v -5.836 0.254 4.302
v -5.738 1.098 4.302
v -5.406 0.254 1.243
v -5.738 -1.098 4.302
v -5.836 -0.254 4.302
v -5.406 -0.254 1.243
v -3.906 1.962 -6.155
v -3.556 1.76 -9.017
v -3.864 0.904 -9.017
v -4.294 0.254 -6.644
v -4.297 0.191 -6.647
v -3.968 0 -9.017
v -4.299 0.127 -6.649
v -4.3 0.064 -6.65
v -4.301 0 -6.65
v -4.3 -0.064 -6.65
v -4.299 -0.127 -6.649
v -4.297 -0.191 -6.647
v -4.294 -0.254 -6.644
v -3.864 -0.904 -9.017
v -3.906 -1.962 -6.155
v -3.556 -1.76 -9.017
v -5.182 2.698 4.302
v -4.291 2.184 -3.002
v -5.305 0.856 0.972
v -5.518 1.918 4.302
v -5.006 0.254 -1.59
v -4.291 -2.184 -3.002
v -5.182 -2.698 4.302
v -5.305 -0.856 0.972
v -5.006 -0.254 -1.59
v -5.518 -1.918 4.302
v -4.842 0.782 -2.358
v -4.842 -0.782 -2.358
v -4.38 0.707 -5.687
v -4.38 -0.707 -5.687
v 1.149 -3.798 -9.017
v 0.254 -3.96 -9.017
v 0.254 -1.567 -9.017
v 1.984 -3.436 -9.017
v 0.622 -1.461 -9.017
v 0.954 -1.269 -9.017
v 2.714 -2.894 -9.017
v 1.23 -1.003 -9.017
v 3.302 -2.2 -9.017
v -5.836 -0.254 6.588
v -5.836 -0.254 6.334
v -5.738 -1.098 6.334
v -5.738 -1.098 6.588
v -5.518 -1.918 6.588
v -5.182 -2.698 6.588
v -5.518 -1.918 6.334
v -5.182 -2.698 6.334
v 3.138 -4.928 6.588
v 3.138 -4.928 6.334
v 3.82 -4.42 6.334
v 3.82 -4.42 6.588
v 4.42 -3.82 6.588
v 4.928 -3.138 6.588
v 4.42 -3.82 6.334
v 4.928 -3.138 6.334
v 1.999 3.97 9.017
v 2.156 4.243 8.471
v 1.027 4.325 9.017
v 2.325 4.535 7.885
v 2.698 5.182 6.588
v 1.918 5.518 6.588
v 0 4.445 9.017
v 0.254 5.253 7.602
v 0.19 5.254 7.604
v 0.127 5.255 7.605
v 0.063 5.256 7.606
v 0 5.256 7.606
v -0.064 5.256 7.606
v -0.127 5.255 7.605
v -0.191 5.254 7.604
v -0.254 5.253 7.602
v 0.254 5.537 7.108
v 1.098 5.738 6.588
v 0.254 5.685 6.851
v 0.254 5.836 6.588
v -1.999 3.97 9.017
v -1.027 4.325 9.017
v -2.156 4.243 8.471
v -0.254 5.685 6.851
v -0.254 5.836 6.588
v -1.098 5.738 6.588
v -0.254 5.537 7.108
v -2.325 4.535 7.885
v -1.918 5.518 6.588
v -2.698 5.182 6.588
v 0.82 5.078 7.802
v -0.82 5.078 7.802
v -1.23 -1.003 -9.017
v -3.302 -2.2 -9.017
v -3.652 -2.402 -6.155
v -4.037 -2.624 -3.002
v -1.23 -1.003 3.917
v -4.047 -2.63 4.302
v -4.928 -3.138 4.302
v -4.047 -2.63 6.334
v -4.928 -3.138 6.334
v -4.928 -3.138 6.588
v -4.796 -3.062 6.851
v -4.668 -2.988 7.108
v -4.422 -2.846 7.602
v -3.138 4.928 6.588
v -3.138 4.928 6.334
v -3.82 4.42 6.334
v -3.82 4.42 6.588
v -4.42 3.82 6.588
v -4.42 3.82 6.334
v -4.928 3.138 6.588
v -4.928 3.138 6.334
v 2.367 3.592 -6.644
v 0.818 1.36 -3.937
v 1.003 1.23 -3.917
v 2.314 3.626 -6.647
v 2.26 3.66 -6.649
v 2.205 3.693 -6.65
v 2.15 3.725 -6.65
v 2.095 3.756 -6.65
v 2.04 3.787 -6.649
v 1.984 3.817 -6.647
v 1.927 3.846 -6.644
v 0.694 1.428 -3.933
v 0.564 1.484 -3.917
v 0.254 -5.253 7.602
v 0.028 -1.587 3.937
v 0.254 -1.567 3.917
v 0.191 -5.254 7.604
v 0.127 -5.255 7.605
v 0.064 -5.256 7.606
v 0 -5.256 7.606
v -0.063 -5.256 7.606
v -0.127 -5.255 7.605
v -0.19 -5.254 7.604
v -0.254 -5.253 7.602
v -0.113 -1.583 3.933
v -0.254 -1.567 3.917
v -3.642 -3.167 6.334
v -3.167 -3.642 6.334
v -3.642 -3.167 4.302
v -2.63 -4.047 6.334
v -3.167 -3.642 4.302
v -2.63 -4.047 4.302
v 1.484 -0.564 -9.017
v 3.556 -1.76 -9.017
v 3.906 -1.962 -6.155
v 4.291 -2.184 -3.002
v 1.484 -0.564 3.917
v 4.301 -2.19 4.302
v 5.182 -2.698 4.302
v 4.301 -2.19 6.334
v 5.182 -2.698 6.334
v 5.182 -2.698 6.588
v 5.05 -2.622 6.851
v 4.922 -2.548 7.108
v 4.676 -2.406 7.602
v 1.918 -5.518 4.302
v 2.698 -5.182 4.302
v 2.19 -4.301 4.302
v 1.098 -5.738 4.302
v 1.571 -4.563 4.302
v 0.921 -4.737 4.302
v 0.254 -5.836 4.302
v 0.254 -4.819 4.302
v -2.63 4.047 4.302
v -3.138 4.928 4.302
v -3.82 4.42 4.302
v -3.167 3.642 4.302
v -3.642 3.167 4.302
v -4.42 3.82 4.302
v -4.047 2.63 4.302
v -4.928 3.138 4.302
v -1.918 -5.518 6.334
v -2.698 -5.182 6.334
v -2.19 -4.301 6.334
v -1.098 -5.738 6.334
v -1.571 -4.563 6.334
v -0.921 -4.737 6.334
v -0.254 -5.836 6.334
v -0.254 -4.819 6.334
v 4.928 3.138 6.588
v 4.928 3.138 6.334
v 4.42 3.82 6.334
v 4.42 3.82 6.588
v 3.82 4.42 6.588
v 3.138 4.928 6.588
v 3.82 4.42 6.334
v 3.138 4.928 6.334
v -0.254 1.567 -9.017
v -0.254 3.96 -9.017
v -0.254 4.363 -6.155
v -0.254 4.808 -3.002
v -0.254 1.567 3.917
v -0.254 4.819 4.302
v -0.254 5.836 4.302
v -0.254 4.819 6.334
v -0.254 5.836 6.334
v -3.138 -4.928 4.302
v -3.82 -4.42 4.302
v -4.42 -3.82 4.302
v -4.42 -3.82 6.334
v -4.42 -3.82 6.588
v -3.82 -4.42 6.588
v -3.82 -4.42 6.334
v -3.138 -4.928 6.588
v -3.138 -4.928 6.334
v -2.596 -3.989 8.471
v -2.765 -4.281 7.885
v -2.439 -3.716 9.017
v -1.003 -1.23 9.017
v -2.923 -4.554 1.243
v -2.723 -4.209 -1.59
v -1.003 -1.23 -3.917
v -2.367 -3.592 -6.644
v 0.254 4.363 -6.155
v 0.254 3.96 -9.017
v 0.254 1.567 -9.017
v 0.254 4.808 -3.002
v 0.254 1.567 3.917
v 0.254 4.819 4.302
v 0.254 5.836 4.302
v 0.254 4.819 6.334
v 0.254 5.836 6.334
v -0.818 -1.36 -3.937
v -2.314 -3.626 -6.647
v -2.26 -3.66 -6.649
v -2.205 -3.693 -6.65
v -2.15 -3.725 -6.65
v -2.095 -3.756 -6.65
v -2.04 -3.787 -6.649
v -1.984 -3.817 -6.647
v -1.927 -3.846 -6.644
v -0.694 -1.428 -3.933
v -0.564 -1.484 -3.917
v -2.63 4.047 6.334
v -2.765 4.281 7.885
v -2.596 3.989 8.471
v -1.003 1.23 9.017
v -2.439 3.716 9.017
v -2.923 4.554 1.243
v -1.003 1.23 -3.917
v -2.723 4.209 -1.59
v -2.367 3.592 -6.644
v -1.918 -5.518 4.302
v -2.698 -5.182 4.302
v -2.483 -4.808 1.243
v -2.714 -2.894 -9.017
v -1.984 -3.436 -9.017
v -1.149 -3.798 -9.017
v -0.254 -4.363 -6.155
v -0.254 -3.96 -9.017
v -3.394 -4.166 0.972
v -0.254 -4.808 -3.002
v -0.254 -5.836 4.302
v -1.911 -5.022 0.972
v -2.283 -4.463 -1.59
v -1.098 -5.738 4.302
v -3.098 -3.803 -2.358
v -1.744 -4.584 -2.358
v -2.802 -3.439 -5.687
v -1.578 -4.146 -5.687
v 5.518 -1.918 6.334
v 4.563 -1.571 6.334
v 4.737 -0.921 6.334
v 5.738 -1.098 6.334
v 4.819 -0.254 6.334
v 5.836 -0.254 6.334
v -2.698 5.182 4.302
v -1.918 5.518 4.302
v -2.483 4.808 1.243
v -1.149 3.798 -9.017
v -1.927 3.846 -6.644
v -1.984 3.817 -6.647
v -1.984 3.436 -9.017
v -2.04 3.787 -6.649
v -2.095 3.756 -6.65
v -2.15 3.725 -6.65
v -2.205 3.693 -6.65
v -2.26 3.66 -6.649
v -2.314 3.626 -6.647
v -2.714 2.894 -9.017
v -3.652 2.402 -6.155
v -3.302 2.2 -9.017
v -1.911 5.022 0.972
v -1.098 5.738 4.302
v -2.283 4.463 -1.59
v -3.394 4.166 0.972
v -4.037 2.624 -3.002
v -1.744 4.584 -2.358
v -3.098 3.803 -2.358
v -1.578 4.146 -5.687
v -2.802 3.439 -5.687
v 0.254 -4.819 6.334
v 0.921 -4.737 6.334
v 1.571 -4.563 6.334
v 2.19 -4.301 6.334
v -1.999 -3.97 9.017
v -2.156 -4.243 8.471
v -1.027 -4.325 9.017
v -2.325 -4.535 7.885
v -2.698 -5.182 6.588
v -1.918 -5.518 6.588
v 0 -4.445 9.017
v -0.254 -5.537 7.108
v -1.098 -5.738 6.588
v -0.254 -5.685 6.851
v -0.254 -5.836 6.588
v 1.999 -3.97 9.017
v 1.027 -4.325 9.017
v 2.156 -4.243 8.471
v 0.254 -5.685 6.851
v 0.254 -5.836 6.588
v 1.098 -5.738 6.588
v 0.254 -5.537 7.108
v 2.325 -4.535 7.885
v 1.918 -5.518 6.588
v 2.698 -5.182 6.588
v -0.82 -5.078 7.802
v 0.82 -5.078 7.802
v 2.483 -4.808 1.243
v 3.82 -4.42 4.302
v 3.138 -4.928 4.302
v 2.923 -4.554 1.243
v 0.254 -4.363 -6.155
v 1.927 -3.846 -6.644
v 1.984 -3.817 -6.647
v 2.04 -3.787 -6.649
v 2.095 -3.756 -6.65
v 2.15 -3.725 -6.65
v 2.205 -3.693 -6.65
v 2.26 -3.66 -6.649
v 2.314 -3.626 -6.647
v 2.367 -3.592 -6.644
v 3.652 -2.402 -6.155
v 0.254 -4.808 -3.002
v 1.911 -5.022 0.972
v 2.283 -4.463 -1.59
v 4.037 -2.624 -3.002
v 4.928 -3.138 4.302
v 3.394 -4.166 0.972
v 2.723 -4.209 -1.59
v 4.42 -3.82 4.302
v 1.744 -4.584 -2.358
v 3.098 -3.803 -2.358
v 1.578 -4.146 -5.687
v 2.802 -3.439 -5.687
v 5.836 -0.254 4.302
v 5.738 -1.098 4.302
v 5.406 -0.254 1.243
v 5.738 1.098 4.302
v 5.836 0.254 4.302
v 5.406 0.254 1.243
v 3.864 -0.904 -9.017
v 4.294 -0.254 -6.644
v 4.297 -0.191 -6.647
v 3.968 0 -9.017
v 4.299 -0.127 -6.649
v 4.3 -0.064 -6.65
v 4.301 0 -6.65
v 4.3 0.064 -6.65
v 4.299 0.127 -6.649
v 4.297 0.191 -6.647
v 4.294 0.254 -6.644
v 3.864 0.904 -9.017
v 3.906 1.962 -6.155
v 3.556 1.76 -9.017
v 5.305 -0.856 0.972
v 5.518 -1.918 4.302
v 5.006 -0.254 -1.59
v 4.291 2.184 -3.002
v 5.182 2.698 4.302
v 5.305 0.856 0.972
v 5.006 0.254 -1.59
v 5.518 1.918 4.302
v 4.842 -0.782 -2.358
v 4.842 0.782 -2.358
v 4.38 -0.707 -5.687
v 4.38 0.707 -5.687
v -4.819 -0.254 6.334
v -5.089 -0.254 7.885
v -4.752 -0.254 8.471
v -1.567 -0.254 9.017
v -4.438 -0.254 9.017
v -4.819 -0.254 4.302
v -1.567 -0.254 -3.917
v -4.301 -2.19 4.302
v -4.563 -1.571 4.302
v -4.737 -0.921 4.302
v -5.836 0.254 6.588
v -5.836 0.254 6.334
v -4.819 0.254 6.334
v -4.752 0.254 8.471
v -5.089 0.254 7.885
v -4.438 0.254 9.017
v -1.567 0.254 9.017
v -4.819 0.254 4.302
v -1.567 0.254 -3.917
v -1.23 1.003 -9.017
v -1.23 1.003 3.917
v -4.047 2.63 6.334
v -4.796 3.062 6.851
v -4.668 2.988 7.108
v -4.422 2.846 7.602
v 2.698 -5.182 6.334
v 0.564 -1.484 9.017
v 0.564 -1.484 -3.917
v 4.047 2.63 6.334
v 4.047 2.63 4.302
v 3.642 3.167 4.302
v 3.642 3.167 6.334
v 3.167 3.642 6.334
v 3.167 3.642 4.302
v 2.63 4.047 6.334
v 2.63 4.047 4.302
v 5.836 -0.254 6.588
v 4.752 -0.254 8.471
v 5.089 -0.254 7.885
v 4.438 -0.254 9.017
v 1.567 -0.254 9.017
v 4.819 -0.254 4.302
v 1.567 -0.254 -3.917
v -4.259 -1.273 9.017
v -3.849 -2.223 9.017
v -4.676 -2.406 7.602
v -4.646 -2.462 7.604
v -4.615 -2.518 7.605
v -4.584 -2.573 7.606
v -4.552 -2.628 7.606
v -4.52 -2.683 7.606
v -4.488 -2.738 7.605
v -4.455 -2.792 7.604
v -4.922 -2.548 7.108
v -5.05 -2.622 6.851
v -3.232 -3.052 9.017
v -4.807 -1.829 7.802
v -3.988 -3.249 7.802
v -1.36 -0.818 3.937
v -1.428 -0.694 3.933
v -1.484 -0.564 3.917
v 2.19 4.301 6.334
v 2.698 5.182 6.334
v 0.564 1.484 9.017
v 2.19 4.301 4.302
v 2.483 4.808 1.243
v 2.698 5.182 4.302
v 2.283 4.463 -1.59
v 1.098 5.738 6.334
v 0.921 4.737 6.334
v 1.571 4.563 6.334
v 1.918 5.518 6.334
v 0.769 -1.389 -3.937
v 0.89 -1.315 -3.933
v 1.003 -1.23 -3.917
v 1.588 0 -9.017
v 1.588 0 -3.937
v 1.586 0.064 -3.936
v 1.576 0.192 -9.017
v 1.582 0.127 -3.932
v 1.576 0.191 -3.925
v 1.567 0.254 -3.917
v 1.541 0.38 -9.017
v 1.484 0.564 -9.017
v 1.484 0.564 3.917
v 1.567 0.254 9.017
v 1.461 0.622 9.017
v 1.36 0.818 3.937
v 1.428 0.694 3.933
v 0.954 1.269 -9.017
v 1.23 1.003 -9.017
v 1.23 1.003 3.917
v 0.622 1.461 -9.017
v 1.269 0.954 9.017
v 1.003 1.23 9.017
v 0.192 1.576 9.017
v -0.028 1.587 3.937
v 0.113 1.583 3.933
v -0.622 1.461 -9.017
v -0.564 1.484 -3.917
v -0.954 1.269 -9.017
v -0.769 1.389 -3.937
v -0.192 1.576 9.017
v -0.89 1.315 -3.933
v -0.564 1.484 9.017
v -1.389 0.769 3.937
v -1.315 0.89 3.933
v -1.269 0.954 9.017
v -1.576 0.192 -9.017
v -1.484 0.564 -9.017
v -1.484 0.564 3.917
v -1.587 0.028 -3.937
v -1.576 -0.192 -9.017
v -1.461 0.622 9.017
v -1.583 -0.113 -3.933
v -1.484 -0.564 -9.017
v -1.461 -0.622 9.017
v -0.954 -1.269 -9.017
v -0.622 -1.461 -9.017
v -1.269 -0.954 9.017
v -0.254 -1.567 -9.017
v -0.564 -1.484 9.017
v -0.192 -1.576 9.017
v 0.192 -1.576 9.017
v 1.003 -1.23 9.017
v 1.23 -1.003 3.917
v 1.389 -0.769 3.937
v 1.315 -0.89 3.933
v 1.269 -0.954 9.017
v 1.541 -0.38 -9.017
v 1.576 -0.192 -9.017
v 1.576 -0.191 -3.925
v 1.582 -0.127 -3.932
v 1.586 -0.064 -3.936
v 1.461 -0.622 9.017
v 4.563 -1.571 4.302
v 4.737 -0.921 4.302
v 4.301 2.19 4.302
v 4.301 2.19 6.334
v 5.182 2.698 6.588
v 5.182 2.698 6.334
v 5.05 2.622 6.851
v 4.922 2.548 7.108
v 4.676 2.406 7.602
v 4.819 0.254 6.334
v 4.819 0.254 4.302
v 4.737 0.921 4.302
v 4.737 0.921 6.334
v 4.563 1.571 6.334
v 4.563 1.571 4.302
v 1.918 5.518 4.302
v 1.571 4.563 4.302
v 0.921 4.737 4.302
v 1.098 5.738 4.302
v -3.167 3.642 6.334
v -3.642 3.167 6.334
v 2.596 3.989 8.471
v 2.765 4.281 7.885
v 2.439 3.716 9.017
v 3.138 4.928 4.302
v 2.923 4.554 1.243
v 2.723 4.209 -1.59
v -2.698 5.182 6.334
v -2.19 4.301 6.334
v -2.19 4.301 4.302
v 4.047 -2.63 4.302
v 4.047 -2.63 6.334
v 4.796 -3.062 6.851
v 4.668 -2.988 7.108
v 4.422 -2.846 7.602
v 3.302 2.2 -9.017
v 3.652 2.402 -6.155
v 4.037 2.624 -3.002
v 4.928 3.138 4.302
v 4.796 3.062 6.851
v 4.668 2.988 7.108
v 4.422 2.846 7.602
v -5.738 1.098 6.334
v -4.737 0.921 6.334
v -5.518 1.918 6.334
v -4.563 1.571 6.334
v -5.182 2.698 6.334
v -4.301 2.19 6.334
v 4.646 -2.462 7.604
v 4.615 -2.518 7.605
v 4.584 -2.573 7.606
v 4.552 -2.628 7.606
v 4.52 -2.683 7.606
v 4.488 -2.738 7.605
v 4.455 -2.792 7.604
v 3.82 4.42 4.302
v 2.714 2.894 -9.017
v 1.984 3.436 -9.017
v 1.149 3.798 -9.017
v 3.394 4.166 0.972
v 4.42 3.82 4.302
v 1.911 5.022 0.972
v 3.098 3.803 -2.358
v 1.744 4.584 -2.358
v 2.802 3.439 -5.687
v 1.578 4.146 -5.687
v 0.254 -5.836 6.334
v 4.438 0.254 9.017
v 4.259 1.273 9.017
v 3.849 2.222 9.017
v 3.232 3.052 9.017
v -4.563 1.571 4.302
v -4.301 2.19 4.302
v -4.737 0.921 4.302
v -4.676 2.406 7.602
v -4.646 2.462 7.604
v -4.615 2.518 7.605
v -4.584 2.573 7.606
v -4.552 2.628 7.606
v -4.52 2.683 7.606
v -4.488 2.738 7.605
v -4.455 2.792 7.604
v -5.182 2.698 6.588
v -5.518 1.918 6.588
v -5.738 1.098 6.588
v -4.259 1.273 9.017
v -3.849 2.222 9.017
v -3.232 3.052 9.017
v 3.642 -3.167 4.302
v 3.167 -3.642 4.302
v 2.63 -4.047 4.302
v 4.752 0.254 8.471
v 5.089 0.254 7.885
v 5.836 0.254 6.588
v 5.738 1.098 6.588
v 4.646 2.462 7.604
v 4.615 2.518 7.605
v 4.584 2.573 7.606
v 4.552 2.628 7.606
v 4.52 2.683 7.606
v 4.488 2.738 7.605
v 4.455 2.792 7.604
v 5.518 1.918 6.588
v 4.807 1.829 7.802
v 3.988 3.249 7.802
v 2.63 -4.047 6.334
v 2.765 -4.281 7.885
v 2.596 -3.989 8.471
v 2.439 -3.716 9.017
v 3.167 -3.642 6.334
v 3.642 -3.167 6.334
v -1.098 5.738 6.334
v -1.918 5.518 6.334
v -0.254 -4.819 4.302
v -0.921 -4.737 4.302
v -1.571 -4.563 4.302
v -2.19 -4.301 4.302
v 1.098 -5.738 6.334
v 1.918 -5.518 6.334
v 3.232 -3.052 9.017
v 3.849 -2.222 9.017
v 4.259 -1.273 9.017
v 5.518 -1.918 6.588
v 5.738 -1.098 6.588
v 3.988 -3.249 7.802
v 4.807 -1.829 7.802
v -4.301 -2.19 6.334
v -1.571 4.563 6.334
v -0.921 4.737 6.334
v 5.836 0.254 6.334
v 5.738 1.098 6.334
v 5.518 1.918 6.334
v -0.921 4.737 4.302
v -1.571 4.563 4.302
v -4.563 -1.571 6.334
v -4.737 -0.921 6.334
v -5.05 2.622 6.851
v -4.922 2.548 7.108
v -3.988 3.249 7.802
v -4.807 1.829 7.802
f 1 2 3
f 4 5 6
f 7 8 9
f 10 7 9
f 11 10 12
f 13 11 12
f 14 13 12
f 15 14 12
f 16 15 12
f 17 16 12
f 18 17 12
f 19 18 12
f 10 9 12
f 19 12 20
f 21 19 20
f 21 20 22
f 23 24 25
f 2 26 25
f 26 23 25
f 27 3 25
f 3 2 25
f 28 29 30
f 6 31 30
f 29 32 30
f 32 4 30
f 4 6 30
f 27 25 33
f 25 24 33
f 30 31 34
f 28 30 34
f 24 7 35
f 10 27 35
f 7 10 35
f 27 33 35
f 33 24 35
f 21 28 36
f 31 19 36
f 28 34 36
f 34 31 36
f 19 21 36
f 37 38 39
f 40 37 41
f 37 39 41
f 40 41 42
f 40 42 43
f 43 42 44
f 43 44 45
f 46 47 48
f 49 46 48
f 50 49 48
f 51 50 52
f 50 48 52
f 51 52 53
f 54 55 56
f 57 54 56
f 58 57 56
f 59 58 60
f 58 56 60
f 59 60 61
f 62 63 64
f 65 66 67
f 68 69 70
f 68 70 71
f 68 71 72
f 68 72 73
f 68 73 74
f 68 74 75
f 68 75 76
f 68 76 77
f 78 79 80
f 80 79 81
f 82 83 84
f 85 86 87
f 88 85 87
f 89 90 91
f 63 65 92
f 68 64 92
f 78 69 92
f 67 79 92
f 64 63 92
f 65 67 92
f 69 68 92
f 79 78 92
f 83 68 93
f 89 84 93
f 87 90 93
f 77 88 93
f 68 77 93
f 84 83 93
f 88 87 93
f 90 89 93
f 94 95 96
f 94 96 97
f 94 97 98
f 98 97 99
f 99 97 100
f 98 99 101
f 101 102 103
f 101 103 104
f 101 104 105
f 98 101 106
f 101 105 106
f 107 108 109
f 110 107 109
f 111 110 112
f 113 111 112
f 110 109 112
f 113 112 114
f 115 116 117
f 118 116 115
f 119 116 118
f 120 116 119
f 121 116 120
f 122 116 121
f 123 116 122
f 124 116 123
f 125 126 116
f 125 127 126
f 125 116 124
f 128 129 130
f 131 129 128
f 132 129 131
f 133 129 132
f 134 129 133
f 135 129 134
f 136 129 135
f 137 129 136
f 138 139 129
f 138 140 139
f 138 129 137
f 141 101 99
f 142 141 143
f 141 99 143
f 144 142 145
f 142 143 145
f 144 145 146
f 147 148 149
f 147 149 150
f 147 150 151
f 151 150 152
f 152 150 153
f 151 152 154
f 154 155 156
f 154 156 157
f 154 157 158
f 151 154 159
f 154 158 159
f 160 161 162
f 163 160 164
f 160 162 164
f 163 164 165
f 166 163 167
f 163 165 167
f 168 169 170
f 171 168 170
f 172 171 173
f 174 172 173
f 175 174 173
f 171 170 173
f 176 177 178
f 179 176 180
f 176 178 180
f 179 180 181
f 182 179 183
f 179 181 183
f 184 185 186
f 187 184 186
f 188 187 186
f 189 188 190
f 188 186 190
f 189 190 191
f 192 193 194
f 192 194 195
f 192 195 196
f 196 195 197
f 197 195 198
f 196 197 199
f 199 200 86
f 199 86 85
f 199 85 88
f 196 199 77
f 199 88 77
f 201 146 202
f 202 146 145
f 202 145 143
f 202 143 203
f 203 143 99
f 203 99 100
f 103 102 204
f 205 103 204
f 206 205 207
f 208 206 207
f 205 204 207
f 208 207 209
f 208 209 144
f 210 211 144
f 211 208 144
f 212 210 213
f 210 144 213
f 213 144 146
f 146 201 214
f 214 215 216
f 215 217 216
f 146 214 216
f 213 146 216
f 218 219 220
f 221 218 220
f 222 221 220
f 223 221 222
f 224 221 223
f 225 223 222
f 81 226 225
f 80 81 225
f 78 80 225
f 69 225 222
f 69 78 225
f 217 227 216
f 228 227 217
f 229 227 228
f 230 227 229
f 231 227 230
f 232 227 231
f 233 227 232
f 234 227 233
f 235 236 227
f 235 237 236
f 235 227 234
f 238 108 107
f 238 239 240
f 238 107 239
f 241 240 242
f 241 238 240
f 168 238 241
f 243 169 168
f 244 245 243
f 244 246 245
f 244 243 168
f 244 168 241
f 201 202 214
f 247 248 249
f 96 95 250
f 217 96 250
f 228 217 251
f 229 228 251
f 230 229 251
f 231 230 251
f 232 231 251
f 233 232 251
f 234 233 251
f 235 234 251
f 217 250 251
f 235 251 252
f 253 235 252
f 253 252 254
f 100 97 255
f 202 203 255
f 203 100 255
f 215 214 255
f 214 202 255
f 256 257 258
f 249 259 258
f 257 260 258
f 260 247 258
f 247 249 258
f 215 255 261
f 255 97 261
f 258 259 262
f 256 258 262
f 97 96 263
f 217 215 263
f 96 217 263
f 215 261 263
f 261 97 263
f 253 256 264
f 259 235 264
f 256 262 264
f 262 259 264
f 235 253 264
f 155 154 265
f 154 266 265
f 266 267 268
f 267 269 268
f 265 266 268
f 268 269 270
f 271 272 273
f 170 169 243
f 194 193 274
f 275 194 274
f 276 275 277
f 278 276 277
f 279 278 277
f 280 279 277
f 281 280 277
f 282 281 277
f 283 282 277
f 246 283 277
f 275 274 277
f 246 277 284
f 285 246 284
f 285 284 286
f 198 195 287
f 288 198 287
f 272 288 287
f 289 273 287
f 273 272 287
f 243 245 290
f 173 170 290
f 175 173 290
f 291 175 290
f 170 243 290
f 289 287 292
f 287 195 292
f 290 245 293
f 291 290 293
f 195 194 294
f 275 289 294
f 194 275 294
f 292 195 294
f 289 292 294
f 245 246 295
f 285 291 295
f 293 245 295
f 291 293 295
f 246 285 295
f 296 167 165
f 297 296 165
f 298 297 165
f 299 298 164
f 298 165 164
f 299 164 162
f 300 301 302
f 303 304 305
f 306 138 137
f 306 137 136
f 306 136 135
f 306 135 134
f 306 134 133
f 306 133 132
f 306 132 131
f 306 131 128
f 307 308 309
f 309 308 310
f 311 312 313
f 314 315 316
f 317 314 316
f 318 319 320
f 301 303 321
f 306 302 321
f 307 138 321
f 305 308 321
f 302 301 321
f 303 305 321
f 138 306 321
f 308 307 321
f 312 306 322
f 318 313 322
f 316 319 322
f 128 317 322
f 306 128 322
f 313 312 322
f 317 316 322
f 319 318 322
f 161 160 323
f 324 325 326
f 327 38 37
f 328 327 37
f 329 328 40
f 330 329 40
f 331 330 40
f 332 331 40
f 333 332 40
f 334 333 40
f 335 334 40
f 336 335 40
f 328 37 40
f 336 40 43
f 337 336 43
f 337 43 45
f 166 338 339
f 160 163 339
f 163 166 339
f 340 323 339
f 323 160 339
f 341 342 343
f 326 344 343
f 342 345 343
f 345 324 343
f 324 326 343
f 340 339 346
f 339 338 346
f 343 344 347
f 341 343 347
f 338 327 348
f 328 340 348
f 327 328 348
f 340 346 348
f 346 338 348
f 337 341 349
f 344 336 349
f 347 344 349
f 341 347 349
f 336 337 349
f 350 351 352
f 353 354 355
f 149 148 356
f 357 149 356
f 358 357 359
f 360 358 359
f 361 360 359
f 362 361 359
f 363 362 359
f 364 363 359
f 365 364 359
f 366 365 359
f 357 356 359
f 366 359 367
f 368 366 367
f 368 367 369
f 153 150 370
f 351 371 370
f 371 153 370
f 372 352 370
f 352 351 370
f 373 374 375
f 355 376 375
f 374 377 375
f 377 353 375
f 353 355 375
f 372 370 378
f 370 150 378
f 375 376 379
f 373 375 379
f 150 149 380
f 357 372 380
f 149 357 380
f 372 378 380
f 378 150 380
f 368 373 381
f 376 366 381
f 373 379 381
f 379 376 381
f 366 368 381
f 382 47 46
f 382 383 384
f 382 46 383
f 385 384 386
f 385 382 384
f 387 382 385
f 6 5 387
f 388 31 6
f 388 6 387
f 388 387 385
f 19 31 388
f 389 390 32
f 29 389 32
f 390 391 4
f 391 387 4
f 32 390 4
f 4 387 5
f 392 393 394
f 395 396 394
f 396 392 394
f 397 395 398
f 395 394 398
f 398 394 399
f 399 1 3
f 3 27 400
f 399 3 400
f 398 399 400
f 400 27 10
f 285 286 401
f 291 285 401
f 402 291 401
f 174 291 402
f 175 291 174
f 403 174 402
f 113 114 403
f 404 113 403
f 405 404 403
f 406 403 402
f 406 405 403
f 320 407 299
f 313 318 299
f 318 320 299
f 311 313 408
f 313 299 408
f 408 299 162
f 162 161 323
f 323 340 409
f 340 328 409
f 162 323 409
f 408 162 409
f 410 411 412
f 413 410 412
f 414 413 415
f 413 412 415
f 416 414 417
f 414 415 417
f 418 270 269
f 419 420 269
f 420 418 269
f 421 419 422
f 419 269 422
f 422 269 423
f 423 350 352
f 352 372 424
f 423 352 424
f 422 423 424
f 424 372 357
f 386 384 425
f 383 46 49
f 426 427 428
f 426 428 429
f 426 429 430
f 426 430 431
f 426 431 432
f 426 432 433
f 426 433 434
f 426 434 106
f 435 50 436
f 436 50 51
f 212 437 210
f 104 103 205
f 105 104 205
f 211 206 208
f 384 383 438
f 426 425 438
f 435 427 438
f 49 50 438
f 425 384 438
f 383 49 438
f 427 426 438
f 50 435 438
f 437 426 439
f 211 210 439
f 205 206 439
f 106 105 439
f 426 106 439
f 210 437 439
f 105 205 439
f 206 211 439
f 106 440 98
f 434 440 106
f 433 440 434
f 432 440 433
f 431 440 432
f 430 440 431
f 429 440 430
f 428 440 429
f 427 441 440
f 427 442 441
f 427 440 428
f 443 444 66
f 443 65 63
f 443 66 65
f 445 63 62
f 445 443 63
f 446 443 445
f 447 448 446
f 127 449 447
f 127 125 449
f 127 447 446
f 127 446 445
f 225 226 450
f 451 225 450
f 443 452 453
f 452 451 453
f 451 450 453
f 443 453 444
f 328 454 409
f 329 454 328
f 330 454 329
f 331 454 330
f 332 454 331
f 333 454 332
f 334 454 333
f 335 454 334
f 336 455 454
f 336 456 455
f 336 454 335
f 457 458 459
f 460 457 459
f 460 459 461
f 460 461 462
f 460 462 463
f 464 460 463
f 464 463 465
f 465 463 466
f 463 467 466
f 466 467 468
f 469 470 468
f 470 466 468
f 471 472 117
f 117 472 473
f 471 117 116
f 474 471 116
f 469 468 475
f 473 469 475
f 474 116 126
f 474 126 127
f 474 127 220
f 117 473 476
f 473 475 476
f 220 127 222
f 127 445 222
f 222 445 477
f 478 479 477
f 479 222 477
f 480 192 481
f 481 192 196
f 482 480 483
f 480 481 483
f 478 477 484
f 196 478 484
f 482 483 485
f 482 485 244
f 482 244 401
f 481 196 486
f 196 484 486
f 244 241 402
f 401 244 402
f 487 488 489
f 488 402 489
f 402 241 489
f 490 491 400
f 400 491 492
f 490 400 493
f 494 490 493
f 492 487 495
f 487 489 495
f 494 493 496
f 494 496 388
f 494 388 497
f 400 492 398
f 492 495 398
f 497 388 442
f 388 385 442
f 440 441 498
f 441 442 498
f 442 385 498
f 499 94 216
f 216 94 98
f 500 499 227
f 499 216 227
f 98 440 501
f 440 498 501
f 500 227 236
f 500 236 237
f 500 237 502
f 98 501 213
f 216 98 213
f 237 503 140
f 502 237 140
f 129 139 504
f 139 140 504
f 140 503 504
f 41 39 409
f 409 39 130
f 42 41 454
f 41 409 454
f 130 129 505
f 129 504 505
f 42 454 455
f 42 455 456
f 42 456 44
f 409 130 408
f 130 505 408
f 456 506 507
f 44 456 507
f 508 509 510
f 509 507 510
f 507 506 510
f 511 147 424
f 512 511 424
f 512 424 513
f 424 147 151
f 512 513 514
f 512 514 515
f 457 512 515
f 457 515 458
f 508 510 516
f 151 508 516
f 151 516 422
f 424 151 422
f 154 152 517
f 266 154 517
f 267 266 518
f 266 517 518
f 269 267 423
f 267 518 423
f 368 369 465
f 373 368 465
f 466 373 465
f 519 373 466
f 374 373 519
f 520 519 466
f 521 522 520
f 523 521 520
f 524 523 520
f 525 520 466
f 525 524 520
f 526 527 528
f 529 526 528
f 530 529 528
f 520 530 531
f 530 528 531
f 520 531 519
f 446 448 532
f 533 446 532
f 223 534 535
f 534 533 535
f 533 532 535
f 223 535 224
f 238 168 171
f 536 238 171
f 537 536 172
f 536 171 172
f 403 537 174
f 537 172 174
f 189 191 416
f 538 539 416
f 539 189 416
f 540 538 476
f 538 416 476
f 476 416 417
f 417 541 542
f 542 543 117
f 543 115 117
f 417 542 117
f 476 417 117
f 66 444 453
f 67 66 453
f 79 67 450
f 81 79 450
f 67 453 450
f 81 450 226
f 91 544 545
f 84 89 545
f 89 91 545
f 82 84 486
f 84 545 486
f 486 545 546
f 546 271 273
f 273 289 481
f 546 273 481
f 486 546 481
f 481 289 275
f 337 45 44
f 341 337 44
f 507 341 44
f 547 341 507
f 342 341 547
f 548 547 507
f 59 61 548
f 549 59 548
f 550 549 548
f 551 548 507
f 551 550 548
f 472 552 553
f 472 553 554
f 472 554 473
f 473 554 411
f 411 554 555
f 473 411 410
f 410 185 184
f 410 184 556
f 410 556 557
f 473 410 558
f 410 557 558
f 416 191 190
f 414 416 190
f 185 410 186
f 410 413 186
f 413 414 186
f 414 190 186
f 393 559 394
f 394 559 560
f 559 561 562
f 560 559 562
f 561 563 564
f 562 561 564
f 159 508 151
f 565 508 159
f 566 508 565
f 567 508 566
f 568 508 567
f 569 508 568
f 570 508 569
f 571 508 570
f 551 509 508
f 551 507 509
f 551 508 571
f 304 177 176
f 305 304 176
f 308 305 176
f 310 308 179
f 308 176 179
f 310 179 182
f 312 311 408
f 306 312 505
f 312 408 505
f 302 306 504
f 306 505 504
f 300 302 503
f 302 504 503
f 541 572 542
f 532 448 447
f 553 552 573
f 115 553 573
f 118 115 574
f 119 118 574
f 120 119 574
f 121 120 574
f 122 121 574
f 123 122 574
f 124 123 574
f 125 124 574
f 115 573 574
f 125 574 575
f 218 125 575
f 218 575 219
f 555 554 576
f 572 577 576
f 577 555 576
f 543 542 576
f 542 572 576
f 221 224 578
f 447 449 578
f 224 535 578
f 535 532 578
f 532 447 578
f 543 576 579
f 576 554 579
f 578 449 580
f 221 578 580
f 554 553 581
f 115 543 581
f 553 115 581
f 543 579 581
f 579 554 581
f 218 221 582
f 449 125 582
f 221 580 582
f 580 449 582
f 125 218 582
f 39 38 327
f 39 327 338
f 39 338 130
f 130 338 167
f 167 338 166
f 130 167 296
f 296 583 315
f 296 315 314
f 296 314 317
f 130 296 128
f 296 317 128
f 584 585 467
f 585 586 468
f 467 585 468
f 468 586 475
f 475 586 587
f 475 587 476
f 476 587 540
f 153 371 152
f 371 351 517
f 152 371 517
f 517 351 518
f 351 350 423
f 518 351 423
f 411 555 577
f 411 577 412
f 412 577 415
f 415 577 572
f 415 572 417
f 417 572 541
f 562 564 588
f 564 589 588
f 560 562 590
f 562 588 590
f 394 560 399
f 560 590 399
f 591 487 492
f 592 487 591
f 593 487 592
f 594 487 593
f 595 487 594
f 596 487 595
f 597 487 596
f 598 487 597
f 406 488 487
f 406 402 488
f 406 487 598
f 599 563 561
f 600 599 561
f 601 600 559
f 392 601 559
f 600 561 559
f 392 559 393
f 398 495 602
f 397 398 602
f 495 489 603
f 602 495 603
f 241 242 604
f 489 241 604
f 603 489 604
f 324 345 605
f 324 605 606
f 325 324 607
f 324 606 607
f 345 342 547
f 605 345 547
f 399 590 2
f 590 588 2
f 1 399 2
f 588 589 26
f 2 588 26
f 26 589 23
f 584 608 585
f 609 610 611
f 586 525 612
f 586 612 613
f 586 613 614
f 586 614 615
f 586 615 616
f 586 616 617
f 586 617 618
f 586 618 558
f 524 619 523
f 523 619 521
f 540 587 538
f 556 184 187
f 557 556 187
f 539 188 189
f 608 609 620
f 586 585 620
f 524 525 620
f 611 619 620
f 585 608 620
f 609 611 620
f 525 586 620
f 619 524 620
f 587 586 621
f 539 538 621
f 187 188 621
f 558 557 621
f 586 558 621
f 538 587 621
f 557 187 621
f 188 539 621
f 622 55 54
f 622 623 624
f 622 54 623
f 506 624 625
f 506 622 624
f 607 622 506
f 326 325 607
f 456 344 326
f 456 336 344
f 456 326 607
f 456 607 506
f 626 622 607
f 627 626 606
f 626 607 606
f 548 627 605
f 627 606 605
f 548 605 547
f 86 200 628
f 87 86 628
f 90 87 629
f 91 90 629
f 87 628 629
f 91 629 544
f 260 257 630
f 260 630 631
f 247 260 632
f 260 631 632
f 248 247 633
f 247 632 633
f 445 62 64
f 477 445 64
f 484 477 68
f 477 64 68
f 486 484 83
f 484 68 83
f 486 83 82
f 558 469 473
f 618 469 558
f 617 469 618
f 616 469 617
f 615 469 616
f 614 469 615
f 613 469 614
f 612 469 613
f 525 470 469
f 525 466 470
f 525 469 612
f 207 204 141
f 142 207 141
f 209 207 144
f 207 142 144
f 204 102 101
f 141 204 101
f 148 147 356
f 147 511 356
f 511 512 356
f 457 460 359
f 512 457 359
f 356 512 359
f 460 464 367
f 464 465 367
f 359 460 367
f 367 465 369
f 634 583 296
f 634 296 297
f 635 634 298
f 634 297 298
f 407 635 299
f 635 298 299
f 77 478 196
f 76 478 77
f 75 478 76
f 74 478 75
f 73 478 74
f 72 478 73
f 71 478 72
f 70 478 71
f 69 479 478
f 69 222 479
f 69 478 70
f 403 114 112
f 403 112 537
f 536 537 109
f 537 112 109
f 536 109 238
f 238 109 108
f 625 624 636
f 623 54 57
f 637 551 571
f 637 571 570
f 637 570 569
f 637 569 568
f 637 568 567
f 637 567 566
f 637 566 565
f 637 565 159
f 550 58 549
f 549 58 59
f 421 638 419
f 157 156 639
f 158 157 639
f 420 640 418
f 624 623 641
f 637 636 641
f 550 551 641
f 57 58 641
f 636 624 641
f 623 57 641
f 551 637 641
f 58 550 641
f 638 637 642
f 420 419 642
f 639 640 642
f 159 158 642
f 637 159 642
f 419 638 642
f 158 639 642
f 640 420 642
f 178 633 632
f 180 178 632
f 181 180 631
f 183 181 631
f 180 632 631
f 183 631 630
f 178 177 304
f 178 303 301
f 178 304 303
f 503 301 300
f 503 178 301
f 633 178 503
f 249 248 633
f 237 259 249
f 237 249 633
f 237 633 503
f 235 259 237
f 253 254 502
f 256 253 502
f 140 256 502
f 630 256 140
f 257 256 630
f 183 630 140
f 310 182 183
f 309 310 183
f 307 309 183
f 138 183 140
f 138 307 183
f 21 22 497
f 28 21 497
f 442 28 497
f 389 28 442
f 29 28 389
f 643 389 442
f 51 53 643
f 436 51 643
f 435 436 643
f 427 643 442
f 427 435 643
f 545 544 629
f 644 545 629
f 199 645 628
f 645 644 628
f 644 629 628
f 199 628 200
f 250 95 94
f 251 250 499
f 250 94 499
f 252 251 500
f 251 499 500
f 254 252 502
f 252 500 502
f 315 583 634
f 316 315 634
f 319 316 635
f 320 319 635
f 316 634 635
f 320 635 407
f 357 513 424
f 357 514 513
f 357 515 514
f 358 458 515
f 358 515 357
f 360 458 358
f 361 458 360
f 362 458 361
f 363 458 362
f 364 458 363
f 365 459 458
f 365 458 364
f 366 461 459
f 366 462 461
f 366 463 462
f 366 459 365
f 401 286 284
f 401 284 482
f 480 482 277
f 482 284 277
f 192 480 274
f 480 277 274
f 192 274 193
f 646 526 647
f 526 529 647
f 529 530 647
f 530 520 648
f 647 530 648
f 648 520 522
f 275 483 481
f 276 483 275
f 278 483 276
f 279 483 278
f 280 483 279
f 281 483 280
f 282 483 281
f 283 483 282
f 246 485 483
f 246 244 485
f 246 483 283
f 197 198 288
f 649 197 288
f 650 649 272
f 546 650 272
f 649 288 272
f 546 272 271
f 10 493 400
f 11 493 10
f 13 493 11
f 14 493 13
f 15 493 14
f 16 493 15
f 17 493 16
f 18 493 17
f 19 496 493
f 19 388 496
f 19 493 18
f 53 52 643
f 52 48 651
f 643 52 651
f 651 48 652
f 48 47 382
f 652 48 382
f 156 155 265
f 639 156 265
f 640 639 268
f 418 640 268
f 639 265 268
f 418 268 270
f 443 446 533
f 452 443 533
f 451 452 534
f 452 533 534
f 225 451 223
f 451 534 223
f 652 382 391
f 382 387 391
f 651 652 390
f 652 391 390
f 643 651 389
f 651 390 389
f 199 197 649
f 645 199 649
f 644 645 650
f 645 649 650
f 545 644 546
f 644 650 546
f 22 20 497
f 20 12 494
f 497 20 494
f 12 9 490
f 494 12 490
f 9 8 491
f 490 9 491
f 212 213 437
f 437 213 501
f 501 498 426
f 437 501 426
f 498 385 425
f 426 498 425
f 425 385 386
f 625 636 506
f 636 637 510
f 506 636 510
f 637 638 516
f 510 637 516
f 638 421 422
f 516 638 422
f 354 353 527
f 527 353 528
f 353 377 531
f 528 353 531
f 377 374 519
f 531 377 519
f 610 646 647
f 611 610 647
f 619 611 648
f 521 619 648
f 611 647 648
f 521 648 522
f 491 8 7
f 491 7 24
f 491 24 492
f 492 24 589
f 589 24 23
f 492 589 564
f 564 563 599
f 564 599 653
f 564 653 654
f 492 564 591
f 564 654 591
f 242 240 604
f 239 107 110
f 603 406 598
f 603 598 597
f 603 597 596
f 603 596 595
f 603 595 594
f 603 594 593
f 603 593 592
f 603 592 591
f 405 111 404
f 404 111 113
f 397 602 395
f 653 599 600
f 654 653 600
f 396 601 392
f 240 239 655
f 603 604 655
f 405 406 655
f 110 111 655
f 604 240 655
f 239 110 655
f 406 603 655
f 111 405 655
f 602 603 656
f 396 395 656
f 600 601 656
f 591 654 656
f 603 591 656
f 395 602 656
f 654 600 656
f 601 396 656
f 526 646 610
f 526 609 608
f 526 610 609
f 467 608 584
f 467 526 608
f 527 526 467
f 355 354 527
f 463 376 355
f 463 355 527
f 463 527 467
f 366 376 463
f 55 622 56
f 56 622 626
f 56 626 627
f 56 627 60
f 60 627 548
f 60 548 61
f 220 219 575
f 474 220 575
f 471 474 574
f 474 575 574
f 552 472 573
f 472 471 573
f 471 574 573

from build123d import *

# Parameters (mm, degrees)
CUT_EXTRUDE3_DEPTH = 0.254
CIRPATTERN1_COUNT  = 6
CUT_EXTRUDE4_DEPTH = 0.254
CIRPATTERN2_COUNT  = 6


with BuildPart() as part:
    # Sketch2 → Revolve1 (revolve)
    with BuildSketch(Plane(origin=(0, 0, 0), x_dir=(1, 0, 0), z_dir=(0, 1, 0))):
        Polygon((4.445, -9.017), (5.842, -6.58754254), (5.842, -6.33354254), (4.826, -6.33354254), (4.826, -4.30154254), (5.842, -4.30154254), (3.967830419, 9.017), (1.5875, 9.017), (1.5875, -9.017), align=None)
    revolve(axis=Axis((0, 0, -9.017), (0, 0, 1)))

    # Sketch3 → Cut-Extrude3 (cut, symmetric)
    with BuildSketch(Plane(origin=(0, 0, 0), x_dir=(0, 0, -1), z_dir=(1, 0, 0))):
        Polygon((-7.605911738, 5.256411738), (-7.605911738, 26.9875), (9.017, 26.9875), (9.017, 0.3175), (-2.667, 0.3175), align=None)
    cut_extrude3 = extrude(amount=CUT_EXTRUDE3_DEPTH, both=True, mode=Mode.SUBTRACT)

    # CirPattern1: Cut-Extrude3 ×6 about axis
    cirpattern1_axis = Axis((0, 0, 0), (0, 0, 1))
    for i in range(1, CIRPATTERN1_COUNT):
        add(cut_extrude3.rotate(cirpattern1_axis, i * 360 / CIRPATTERN1_COUNT), mode=Mode.SUBTRACT)

    # Sketch4 → Cut-Extrude4 (cut, symmetric)
    with BuildSketch(Plane(origin=(0, 0, 0), x_dir=(1, 0, 0), z_dir=(0, 1, 0))):
        Polygon((4.300861057, 6.650361057), (26.9875, 6.650361057), (26.9875, -9.017), (1.5875, -9.017), (0.3175, -9.017), (0.3175, 2.667), align=None)
    cut_extrude4 = extrude(amount=CUT_EXTRUDE4_DEPTH, both=True, mode=Mode.SUBTRACT)

    # CirPattern2: Cut-Extrude4 ×6 about axis
    cirpattern2_axis = Axis((0, 0, 0), (0, 0, 1))
    for i in range(1, CIRPATTERN2_COUNT):
        add(cut_extrude4.rotate(cirpattern2_axis, i * 360 / CIRPATTERN2_COUNT), mode=Mode.SUBTRACT)


solid = part.part
